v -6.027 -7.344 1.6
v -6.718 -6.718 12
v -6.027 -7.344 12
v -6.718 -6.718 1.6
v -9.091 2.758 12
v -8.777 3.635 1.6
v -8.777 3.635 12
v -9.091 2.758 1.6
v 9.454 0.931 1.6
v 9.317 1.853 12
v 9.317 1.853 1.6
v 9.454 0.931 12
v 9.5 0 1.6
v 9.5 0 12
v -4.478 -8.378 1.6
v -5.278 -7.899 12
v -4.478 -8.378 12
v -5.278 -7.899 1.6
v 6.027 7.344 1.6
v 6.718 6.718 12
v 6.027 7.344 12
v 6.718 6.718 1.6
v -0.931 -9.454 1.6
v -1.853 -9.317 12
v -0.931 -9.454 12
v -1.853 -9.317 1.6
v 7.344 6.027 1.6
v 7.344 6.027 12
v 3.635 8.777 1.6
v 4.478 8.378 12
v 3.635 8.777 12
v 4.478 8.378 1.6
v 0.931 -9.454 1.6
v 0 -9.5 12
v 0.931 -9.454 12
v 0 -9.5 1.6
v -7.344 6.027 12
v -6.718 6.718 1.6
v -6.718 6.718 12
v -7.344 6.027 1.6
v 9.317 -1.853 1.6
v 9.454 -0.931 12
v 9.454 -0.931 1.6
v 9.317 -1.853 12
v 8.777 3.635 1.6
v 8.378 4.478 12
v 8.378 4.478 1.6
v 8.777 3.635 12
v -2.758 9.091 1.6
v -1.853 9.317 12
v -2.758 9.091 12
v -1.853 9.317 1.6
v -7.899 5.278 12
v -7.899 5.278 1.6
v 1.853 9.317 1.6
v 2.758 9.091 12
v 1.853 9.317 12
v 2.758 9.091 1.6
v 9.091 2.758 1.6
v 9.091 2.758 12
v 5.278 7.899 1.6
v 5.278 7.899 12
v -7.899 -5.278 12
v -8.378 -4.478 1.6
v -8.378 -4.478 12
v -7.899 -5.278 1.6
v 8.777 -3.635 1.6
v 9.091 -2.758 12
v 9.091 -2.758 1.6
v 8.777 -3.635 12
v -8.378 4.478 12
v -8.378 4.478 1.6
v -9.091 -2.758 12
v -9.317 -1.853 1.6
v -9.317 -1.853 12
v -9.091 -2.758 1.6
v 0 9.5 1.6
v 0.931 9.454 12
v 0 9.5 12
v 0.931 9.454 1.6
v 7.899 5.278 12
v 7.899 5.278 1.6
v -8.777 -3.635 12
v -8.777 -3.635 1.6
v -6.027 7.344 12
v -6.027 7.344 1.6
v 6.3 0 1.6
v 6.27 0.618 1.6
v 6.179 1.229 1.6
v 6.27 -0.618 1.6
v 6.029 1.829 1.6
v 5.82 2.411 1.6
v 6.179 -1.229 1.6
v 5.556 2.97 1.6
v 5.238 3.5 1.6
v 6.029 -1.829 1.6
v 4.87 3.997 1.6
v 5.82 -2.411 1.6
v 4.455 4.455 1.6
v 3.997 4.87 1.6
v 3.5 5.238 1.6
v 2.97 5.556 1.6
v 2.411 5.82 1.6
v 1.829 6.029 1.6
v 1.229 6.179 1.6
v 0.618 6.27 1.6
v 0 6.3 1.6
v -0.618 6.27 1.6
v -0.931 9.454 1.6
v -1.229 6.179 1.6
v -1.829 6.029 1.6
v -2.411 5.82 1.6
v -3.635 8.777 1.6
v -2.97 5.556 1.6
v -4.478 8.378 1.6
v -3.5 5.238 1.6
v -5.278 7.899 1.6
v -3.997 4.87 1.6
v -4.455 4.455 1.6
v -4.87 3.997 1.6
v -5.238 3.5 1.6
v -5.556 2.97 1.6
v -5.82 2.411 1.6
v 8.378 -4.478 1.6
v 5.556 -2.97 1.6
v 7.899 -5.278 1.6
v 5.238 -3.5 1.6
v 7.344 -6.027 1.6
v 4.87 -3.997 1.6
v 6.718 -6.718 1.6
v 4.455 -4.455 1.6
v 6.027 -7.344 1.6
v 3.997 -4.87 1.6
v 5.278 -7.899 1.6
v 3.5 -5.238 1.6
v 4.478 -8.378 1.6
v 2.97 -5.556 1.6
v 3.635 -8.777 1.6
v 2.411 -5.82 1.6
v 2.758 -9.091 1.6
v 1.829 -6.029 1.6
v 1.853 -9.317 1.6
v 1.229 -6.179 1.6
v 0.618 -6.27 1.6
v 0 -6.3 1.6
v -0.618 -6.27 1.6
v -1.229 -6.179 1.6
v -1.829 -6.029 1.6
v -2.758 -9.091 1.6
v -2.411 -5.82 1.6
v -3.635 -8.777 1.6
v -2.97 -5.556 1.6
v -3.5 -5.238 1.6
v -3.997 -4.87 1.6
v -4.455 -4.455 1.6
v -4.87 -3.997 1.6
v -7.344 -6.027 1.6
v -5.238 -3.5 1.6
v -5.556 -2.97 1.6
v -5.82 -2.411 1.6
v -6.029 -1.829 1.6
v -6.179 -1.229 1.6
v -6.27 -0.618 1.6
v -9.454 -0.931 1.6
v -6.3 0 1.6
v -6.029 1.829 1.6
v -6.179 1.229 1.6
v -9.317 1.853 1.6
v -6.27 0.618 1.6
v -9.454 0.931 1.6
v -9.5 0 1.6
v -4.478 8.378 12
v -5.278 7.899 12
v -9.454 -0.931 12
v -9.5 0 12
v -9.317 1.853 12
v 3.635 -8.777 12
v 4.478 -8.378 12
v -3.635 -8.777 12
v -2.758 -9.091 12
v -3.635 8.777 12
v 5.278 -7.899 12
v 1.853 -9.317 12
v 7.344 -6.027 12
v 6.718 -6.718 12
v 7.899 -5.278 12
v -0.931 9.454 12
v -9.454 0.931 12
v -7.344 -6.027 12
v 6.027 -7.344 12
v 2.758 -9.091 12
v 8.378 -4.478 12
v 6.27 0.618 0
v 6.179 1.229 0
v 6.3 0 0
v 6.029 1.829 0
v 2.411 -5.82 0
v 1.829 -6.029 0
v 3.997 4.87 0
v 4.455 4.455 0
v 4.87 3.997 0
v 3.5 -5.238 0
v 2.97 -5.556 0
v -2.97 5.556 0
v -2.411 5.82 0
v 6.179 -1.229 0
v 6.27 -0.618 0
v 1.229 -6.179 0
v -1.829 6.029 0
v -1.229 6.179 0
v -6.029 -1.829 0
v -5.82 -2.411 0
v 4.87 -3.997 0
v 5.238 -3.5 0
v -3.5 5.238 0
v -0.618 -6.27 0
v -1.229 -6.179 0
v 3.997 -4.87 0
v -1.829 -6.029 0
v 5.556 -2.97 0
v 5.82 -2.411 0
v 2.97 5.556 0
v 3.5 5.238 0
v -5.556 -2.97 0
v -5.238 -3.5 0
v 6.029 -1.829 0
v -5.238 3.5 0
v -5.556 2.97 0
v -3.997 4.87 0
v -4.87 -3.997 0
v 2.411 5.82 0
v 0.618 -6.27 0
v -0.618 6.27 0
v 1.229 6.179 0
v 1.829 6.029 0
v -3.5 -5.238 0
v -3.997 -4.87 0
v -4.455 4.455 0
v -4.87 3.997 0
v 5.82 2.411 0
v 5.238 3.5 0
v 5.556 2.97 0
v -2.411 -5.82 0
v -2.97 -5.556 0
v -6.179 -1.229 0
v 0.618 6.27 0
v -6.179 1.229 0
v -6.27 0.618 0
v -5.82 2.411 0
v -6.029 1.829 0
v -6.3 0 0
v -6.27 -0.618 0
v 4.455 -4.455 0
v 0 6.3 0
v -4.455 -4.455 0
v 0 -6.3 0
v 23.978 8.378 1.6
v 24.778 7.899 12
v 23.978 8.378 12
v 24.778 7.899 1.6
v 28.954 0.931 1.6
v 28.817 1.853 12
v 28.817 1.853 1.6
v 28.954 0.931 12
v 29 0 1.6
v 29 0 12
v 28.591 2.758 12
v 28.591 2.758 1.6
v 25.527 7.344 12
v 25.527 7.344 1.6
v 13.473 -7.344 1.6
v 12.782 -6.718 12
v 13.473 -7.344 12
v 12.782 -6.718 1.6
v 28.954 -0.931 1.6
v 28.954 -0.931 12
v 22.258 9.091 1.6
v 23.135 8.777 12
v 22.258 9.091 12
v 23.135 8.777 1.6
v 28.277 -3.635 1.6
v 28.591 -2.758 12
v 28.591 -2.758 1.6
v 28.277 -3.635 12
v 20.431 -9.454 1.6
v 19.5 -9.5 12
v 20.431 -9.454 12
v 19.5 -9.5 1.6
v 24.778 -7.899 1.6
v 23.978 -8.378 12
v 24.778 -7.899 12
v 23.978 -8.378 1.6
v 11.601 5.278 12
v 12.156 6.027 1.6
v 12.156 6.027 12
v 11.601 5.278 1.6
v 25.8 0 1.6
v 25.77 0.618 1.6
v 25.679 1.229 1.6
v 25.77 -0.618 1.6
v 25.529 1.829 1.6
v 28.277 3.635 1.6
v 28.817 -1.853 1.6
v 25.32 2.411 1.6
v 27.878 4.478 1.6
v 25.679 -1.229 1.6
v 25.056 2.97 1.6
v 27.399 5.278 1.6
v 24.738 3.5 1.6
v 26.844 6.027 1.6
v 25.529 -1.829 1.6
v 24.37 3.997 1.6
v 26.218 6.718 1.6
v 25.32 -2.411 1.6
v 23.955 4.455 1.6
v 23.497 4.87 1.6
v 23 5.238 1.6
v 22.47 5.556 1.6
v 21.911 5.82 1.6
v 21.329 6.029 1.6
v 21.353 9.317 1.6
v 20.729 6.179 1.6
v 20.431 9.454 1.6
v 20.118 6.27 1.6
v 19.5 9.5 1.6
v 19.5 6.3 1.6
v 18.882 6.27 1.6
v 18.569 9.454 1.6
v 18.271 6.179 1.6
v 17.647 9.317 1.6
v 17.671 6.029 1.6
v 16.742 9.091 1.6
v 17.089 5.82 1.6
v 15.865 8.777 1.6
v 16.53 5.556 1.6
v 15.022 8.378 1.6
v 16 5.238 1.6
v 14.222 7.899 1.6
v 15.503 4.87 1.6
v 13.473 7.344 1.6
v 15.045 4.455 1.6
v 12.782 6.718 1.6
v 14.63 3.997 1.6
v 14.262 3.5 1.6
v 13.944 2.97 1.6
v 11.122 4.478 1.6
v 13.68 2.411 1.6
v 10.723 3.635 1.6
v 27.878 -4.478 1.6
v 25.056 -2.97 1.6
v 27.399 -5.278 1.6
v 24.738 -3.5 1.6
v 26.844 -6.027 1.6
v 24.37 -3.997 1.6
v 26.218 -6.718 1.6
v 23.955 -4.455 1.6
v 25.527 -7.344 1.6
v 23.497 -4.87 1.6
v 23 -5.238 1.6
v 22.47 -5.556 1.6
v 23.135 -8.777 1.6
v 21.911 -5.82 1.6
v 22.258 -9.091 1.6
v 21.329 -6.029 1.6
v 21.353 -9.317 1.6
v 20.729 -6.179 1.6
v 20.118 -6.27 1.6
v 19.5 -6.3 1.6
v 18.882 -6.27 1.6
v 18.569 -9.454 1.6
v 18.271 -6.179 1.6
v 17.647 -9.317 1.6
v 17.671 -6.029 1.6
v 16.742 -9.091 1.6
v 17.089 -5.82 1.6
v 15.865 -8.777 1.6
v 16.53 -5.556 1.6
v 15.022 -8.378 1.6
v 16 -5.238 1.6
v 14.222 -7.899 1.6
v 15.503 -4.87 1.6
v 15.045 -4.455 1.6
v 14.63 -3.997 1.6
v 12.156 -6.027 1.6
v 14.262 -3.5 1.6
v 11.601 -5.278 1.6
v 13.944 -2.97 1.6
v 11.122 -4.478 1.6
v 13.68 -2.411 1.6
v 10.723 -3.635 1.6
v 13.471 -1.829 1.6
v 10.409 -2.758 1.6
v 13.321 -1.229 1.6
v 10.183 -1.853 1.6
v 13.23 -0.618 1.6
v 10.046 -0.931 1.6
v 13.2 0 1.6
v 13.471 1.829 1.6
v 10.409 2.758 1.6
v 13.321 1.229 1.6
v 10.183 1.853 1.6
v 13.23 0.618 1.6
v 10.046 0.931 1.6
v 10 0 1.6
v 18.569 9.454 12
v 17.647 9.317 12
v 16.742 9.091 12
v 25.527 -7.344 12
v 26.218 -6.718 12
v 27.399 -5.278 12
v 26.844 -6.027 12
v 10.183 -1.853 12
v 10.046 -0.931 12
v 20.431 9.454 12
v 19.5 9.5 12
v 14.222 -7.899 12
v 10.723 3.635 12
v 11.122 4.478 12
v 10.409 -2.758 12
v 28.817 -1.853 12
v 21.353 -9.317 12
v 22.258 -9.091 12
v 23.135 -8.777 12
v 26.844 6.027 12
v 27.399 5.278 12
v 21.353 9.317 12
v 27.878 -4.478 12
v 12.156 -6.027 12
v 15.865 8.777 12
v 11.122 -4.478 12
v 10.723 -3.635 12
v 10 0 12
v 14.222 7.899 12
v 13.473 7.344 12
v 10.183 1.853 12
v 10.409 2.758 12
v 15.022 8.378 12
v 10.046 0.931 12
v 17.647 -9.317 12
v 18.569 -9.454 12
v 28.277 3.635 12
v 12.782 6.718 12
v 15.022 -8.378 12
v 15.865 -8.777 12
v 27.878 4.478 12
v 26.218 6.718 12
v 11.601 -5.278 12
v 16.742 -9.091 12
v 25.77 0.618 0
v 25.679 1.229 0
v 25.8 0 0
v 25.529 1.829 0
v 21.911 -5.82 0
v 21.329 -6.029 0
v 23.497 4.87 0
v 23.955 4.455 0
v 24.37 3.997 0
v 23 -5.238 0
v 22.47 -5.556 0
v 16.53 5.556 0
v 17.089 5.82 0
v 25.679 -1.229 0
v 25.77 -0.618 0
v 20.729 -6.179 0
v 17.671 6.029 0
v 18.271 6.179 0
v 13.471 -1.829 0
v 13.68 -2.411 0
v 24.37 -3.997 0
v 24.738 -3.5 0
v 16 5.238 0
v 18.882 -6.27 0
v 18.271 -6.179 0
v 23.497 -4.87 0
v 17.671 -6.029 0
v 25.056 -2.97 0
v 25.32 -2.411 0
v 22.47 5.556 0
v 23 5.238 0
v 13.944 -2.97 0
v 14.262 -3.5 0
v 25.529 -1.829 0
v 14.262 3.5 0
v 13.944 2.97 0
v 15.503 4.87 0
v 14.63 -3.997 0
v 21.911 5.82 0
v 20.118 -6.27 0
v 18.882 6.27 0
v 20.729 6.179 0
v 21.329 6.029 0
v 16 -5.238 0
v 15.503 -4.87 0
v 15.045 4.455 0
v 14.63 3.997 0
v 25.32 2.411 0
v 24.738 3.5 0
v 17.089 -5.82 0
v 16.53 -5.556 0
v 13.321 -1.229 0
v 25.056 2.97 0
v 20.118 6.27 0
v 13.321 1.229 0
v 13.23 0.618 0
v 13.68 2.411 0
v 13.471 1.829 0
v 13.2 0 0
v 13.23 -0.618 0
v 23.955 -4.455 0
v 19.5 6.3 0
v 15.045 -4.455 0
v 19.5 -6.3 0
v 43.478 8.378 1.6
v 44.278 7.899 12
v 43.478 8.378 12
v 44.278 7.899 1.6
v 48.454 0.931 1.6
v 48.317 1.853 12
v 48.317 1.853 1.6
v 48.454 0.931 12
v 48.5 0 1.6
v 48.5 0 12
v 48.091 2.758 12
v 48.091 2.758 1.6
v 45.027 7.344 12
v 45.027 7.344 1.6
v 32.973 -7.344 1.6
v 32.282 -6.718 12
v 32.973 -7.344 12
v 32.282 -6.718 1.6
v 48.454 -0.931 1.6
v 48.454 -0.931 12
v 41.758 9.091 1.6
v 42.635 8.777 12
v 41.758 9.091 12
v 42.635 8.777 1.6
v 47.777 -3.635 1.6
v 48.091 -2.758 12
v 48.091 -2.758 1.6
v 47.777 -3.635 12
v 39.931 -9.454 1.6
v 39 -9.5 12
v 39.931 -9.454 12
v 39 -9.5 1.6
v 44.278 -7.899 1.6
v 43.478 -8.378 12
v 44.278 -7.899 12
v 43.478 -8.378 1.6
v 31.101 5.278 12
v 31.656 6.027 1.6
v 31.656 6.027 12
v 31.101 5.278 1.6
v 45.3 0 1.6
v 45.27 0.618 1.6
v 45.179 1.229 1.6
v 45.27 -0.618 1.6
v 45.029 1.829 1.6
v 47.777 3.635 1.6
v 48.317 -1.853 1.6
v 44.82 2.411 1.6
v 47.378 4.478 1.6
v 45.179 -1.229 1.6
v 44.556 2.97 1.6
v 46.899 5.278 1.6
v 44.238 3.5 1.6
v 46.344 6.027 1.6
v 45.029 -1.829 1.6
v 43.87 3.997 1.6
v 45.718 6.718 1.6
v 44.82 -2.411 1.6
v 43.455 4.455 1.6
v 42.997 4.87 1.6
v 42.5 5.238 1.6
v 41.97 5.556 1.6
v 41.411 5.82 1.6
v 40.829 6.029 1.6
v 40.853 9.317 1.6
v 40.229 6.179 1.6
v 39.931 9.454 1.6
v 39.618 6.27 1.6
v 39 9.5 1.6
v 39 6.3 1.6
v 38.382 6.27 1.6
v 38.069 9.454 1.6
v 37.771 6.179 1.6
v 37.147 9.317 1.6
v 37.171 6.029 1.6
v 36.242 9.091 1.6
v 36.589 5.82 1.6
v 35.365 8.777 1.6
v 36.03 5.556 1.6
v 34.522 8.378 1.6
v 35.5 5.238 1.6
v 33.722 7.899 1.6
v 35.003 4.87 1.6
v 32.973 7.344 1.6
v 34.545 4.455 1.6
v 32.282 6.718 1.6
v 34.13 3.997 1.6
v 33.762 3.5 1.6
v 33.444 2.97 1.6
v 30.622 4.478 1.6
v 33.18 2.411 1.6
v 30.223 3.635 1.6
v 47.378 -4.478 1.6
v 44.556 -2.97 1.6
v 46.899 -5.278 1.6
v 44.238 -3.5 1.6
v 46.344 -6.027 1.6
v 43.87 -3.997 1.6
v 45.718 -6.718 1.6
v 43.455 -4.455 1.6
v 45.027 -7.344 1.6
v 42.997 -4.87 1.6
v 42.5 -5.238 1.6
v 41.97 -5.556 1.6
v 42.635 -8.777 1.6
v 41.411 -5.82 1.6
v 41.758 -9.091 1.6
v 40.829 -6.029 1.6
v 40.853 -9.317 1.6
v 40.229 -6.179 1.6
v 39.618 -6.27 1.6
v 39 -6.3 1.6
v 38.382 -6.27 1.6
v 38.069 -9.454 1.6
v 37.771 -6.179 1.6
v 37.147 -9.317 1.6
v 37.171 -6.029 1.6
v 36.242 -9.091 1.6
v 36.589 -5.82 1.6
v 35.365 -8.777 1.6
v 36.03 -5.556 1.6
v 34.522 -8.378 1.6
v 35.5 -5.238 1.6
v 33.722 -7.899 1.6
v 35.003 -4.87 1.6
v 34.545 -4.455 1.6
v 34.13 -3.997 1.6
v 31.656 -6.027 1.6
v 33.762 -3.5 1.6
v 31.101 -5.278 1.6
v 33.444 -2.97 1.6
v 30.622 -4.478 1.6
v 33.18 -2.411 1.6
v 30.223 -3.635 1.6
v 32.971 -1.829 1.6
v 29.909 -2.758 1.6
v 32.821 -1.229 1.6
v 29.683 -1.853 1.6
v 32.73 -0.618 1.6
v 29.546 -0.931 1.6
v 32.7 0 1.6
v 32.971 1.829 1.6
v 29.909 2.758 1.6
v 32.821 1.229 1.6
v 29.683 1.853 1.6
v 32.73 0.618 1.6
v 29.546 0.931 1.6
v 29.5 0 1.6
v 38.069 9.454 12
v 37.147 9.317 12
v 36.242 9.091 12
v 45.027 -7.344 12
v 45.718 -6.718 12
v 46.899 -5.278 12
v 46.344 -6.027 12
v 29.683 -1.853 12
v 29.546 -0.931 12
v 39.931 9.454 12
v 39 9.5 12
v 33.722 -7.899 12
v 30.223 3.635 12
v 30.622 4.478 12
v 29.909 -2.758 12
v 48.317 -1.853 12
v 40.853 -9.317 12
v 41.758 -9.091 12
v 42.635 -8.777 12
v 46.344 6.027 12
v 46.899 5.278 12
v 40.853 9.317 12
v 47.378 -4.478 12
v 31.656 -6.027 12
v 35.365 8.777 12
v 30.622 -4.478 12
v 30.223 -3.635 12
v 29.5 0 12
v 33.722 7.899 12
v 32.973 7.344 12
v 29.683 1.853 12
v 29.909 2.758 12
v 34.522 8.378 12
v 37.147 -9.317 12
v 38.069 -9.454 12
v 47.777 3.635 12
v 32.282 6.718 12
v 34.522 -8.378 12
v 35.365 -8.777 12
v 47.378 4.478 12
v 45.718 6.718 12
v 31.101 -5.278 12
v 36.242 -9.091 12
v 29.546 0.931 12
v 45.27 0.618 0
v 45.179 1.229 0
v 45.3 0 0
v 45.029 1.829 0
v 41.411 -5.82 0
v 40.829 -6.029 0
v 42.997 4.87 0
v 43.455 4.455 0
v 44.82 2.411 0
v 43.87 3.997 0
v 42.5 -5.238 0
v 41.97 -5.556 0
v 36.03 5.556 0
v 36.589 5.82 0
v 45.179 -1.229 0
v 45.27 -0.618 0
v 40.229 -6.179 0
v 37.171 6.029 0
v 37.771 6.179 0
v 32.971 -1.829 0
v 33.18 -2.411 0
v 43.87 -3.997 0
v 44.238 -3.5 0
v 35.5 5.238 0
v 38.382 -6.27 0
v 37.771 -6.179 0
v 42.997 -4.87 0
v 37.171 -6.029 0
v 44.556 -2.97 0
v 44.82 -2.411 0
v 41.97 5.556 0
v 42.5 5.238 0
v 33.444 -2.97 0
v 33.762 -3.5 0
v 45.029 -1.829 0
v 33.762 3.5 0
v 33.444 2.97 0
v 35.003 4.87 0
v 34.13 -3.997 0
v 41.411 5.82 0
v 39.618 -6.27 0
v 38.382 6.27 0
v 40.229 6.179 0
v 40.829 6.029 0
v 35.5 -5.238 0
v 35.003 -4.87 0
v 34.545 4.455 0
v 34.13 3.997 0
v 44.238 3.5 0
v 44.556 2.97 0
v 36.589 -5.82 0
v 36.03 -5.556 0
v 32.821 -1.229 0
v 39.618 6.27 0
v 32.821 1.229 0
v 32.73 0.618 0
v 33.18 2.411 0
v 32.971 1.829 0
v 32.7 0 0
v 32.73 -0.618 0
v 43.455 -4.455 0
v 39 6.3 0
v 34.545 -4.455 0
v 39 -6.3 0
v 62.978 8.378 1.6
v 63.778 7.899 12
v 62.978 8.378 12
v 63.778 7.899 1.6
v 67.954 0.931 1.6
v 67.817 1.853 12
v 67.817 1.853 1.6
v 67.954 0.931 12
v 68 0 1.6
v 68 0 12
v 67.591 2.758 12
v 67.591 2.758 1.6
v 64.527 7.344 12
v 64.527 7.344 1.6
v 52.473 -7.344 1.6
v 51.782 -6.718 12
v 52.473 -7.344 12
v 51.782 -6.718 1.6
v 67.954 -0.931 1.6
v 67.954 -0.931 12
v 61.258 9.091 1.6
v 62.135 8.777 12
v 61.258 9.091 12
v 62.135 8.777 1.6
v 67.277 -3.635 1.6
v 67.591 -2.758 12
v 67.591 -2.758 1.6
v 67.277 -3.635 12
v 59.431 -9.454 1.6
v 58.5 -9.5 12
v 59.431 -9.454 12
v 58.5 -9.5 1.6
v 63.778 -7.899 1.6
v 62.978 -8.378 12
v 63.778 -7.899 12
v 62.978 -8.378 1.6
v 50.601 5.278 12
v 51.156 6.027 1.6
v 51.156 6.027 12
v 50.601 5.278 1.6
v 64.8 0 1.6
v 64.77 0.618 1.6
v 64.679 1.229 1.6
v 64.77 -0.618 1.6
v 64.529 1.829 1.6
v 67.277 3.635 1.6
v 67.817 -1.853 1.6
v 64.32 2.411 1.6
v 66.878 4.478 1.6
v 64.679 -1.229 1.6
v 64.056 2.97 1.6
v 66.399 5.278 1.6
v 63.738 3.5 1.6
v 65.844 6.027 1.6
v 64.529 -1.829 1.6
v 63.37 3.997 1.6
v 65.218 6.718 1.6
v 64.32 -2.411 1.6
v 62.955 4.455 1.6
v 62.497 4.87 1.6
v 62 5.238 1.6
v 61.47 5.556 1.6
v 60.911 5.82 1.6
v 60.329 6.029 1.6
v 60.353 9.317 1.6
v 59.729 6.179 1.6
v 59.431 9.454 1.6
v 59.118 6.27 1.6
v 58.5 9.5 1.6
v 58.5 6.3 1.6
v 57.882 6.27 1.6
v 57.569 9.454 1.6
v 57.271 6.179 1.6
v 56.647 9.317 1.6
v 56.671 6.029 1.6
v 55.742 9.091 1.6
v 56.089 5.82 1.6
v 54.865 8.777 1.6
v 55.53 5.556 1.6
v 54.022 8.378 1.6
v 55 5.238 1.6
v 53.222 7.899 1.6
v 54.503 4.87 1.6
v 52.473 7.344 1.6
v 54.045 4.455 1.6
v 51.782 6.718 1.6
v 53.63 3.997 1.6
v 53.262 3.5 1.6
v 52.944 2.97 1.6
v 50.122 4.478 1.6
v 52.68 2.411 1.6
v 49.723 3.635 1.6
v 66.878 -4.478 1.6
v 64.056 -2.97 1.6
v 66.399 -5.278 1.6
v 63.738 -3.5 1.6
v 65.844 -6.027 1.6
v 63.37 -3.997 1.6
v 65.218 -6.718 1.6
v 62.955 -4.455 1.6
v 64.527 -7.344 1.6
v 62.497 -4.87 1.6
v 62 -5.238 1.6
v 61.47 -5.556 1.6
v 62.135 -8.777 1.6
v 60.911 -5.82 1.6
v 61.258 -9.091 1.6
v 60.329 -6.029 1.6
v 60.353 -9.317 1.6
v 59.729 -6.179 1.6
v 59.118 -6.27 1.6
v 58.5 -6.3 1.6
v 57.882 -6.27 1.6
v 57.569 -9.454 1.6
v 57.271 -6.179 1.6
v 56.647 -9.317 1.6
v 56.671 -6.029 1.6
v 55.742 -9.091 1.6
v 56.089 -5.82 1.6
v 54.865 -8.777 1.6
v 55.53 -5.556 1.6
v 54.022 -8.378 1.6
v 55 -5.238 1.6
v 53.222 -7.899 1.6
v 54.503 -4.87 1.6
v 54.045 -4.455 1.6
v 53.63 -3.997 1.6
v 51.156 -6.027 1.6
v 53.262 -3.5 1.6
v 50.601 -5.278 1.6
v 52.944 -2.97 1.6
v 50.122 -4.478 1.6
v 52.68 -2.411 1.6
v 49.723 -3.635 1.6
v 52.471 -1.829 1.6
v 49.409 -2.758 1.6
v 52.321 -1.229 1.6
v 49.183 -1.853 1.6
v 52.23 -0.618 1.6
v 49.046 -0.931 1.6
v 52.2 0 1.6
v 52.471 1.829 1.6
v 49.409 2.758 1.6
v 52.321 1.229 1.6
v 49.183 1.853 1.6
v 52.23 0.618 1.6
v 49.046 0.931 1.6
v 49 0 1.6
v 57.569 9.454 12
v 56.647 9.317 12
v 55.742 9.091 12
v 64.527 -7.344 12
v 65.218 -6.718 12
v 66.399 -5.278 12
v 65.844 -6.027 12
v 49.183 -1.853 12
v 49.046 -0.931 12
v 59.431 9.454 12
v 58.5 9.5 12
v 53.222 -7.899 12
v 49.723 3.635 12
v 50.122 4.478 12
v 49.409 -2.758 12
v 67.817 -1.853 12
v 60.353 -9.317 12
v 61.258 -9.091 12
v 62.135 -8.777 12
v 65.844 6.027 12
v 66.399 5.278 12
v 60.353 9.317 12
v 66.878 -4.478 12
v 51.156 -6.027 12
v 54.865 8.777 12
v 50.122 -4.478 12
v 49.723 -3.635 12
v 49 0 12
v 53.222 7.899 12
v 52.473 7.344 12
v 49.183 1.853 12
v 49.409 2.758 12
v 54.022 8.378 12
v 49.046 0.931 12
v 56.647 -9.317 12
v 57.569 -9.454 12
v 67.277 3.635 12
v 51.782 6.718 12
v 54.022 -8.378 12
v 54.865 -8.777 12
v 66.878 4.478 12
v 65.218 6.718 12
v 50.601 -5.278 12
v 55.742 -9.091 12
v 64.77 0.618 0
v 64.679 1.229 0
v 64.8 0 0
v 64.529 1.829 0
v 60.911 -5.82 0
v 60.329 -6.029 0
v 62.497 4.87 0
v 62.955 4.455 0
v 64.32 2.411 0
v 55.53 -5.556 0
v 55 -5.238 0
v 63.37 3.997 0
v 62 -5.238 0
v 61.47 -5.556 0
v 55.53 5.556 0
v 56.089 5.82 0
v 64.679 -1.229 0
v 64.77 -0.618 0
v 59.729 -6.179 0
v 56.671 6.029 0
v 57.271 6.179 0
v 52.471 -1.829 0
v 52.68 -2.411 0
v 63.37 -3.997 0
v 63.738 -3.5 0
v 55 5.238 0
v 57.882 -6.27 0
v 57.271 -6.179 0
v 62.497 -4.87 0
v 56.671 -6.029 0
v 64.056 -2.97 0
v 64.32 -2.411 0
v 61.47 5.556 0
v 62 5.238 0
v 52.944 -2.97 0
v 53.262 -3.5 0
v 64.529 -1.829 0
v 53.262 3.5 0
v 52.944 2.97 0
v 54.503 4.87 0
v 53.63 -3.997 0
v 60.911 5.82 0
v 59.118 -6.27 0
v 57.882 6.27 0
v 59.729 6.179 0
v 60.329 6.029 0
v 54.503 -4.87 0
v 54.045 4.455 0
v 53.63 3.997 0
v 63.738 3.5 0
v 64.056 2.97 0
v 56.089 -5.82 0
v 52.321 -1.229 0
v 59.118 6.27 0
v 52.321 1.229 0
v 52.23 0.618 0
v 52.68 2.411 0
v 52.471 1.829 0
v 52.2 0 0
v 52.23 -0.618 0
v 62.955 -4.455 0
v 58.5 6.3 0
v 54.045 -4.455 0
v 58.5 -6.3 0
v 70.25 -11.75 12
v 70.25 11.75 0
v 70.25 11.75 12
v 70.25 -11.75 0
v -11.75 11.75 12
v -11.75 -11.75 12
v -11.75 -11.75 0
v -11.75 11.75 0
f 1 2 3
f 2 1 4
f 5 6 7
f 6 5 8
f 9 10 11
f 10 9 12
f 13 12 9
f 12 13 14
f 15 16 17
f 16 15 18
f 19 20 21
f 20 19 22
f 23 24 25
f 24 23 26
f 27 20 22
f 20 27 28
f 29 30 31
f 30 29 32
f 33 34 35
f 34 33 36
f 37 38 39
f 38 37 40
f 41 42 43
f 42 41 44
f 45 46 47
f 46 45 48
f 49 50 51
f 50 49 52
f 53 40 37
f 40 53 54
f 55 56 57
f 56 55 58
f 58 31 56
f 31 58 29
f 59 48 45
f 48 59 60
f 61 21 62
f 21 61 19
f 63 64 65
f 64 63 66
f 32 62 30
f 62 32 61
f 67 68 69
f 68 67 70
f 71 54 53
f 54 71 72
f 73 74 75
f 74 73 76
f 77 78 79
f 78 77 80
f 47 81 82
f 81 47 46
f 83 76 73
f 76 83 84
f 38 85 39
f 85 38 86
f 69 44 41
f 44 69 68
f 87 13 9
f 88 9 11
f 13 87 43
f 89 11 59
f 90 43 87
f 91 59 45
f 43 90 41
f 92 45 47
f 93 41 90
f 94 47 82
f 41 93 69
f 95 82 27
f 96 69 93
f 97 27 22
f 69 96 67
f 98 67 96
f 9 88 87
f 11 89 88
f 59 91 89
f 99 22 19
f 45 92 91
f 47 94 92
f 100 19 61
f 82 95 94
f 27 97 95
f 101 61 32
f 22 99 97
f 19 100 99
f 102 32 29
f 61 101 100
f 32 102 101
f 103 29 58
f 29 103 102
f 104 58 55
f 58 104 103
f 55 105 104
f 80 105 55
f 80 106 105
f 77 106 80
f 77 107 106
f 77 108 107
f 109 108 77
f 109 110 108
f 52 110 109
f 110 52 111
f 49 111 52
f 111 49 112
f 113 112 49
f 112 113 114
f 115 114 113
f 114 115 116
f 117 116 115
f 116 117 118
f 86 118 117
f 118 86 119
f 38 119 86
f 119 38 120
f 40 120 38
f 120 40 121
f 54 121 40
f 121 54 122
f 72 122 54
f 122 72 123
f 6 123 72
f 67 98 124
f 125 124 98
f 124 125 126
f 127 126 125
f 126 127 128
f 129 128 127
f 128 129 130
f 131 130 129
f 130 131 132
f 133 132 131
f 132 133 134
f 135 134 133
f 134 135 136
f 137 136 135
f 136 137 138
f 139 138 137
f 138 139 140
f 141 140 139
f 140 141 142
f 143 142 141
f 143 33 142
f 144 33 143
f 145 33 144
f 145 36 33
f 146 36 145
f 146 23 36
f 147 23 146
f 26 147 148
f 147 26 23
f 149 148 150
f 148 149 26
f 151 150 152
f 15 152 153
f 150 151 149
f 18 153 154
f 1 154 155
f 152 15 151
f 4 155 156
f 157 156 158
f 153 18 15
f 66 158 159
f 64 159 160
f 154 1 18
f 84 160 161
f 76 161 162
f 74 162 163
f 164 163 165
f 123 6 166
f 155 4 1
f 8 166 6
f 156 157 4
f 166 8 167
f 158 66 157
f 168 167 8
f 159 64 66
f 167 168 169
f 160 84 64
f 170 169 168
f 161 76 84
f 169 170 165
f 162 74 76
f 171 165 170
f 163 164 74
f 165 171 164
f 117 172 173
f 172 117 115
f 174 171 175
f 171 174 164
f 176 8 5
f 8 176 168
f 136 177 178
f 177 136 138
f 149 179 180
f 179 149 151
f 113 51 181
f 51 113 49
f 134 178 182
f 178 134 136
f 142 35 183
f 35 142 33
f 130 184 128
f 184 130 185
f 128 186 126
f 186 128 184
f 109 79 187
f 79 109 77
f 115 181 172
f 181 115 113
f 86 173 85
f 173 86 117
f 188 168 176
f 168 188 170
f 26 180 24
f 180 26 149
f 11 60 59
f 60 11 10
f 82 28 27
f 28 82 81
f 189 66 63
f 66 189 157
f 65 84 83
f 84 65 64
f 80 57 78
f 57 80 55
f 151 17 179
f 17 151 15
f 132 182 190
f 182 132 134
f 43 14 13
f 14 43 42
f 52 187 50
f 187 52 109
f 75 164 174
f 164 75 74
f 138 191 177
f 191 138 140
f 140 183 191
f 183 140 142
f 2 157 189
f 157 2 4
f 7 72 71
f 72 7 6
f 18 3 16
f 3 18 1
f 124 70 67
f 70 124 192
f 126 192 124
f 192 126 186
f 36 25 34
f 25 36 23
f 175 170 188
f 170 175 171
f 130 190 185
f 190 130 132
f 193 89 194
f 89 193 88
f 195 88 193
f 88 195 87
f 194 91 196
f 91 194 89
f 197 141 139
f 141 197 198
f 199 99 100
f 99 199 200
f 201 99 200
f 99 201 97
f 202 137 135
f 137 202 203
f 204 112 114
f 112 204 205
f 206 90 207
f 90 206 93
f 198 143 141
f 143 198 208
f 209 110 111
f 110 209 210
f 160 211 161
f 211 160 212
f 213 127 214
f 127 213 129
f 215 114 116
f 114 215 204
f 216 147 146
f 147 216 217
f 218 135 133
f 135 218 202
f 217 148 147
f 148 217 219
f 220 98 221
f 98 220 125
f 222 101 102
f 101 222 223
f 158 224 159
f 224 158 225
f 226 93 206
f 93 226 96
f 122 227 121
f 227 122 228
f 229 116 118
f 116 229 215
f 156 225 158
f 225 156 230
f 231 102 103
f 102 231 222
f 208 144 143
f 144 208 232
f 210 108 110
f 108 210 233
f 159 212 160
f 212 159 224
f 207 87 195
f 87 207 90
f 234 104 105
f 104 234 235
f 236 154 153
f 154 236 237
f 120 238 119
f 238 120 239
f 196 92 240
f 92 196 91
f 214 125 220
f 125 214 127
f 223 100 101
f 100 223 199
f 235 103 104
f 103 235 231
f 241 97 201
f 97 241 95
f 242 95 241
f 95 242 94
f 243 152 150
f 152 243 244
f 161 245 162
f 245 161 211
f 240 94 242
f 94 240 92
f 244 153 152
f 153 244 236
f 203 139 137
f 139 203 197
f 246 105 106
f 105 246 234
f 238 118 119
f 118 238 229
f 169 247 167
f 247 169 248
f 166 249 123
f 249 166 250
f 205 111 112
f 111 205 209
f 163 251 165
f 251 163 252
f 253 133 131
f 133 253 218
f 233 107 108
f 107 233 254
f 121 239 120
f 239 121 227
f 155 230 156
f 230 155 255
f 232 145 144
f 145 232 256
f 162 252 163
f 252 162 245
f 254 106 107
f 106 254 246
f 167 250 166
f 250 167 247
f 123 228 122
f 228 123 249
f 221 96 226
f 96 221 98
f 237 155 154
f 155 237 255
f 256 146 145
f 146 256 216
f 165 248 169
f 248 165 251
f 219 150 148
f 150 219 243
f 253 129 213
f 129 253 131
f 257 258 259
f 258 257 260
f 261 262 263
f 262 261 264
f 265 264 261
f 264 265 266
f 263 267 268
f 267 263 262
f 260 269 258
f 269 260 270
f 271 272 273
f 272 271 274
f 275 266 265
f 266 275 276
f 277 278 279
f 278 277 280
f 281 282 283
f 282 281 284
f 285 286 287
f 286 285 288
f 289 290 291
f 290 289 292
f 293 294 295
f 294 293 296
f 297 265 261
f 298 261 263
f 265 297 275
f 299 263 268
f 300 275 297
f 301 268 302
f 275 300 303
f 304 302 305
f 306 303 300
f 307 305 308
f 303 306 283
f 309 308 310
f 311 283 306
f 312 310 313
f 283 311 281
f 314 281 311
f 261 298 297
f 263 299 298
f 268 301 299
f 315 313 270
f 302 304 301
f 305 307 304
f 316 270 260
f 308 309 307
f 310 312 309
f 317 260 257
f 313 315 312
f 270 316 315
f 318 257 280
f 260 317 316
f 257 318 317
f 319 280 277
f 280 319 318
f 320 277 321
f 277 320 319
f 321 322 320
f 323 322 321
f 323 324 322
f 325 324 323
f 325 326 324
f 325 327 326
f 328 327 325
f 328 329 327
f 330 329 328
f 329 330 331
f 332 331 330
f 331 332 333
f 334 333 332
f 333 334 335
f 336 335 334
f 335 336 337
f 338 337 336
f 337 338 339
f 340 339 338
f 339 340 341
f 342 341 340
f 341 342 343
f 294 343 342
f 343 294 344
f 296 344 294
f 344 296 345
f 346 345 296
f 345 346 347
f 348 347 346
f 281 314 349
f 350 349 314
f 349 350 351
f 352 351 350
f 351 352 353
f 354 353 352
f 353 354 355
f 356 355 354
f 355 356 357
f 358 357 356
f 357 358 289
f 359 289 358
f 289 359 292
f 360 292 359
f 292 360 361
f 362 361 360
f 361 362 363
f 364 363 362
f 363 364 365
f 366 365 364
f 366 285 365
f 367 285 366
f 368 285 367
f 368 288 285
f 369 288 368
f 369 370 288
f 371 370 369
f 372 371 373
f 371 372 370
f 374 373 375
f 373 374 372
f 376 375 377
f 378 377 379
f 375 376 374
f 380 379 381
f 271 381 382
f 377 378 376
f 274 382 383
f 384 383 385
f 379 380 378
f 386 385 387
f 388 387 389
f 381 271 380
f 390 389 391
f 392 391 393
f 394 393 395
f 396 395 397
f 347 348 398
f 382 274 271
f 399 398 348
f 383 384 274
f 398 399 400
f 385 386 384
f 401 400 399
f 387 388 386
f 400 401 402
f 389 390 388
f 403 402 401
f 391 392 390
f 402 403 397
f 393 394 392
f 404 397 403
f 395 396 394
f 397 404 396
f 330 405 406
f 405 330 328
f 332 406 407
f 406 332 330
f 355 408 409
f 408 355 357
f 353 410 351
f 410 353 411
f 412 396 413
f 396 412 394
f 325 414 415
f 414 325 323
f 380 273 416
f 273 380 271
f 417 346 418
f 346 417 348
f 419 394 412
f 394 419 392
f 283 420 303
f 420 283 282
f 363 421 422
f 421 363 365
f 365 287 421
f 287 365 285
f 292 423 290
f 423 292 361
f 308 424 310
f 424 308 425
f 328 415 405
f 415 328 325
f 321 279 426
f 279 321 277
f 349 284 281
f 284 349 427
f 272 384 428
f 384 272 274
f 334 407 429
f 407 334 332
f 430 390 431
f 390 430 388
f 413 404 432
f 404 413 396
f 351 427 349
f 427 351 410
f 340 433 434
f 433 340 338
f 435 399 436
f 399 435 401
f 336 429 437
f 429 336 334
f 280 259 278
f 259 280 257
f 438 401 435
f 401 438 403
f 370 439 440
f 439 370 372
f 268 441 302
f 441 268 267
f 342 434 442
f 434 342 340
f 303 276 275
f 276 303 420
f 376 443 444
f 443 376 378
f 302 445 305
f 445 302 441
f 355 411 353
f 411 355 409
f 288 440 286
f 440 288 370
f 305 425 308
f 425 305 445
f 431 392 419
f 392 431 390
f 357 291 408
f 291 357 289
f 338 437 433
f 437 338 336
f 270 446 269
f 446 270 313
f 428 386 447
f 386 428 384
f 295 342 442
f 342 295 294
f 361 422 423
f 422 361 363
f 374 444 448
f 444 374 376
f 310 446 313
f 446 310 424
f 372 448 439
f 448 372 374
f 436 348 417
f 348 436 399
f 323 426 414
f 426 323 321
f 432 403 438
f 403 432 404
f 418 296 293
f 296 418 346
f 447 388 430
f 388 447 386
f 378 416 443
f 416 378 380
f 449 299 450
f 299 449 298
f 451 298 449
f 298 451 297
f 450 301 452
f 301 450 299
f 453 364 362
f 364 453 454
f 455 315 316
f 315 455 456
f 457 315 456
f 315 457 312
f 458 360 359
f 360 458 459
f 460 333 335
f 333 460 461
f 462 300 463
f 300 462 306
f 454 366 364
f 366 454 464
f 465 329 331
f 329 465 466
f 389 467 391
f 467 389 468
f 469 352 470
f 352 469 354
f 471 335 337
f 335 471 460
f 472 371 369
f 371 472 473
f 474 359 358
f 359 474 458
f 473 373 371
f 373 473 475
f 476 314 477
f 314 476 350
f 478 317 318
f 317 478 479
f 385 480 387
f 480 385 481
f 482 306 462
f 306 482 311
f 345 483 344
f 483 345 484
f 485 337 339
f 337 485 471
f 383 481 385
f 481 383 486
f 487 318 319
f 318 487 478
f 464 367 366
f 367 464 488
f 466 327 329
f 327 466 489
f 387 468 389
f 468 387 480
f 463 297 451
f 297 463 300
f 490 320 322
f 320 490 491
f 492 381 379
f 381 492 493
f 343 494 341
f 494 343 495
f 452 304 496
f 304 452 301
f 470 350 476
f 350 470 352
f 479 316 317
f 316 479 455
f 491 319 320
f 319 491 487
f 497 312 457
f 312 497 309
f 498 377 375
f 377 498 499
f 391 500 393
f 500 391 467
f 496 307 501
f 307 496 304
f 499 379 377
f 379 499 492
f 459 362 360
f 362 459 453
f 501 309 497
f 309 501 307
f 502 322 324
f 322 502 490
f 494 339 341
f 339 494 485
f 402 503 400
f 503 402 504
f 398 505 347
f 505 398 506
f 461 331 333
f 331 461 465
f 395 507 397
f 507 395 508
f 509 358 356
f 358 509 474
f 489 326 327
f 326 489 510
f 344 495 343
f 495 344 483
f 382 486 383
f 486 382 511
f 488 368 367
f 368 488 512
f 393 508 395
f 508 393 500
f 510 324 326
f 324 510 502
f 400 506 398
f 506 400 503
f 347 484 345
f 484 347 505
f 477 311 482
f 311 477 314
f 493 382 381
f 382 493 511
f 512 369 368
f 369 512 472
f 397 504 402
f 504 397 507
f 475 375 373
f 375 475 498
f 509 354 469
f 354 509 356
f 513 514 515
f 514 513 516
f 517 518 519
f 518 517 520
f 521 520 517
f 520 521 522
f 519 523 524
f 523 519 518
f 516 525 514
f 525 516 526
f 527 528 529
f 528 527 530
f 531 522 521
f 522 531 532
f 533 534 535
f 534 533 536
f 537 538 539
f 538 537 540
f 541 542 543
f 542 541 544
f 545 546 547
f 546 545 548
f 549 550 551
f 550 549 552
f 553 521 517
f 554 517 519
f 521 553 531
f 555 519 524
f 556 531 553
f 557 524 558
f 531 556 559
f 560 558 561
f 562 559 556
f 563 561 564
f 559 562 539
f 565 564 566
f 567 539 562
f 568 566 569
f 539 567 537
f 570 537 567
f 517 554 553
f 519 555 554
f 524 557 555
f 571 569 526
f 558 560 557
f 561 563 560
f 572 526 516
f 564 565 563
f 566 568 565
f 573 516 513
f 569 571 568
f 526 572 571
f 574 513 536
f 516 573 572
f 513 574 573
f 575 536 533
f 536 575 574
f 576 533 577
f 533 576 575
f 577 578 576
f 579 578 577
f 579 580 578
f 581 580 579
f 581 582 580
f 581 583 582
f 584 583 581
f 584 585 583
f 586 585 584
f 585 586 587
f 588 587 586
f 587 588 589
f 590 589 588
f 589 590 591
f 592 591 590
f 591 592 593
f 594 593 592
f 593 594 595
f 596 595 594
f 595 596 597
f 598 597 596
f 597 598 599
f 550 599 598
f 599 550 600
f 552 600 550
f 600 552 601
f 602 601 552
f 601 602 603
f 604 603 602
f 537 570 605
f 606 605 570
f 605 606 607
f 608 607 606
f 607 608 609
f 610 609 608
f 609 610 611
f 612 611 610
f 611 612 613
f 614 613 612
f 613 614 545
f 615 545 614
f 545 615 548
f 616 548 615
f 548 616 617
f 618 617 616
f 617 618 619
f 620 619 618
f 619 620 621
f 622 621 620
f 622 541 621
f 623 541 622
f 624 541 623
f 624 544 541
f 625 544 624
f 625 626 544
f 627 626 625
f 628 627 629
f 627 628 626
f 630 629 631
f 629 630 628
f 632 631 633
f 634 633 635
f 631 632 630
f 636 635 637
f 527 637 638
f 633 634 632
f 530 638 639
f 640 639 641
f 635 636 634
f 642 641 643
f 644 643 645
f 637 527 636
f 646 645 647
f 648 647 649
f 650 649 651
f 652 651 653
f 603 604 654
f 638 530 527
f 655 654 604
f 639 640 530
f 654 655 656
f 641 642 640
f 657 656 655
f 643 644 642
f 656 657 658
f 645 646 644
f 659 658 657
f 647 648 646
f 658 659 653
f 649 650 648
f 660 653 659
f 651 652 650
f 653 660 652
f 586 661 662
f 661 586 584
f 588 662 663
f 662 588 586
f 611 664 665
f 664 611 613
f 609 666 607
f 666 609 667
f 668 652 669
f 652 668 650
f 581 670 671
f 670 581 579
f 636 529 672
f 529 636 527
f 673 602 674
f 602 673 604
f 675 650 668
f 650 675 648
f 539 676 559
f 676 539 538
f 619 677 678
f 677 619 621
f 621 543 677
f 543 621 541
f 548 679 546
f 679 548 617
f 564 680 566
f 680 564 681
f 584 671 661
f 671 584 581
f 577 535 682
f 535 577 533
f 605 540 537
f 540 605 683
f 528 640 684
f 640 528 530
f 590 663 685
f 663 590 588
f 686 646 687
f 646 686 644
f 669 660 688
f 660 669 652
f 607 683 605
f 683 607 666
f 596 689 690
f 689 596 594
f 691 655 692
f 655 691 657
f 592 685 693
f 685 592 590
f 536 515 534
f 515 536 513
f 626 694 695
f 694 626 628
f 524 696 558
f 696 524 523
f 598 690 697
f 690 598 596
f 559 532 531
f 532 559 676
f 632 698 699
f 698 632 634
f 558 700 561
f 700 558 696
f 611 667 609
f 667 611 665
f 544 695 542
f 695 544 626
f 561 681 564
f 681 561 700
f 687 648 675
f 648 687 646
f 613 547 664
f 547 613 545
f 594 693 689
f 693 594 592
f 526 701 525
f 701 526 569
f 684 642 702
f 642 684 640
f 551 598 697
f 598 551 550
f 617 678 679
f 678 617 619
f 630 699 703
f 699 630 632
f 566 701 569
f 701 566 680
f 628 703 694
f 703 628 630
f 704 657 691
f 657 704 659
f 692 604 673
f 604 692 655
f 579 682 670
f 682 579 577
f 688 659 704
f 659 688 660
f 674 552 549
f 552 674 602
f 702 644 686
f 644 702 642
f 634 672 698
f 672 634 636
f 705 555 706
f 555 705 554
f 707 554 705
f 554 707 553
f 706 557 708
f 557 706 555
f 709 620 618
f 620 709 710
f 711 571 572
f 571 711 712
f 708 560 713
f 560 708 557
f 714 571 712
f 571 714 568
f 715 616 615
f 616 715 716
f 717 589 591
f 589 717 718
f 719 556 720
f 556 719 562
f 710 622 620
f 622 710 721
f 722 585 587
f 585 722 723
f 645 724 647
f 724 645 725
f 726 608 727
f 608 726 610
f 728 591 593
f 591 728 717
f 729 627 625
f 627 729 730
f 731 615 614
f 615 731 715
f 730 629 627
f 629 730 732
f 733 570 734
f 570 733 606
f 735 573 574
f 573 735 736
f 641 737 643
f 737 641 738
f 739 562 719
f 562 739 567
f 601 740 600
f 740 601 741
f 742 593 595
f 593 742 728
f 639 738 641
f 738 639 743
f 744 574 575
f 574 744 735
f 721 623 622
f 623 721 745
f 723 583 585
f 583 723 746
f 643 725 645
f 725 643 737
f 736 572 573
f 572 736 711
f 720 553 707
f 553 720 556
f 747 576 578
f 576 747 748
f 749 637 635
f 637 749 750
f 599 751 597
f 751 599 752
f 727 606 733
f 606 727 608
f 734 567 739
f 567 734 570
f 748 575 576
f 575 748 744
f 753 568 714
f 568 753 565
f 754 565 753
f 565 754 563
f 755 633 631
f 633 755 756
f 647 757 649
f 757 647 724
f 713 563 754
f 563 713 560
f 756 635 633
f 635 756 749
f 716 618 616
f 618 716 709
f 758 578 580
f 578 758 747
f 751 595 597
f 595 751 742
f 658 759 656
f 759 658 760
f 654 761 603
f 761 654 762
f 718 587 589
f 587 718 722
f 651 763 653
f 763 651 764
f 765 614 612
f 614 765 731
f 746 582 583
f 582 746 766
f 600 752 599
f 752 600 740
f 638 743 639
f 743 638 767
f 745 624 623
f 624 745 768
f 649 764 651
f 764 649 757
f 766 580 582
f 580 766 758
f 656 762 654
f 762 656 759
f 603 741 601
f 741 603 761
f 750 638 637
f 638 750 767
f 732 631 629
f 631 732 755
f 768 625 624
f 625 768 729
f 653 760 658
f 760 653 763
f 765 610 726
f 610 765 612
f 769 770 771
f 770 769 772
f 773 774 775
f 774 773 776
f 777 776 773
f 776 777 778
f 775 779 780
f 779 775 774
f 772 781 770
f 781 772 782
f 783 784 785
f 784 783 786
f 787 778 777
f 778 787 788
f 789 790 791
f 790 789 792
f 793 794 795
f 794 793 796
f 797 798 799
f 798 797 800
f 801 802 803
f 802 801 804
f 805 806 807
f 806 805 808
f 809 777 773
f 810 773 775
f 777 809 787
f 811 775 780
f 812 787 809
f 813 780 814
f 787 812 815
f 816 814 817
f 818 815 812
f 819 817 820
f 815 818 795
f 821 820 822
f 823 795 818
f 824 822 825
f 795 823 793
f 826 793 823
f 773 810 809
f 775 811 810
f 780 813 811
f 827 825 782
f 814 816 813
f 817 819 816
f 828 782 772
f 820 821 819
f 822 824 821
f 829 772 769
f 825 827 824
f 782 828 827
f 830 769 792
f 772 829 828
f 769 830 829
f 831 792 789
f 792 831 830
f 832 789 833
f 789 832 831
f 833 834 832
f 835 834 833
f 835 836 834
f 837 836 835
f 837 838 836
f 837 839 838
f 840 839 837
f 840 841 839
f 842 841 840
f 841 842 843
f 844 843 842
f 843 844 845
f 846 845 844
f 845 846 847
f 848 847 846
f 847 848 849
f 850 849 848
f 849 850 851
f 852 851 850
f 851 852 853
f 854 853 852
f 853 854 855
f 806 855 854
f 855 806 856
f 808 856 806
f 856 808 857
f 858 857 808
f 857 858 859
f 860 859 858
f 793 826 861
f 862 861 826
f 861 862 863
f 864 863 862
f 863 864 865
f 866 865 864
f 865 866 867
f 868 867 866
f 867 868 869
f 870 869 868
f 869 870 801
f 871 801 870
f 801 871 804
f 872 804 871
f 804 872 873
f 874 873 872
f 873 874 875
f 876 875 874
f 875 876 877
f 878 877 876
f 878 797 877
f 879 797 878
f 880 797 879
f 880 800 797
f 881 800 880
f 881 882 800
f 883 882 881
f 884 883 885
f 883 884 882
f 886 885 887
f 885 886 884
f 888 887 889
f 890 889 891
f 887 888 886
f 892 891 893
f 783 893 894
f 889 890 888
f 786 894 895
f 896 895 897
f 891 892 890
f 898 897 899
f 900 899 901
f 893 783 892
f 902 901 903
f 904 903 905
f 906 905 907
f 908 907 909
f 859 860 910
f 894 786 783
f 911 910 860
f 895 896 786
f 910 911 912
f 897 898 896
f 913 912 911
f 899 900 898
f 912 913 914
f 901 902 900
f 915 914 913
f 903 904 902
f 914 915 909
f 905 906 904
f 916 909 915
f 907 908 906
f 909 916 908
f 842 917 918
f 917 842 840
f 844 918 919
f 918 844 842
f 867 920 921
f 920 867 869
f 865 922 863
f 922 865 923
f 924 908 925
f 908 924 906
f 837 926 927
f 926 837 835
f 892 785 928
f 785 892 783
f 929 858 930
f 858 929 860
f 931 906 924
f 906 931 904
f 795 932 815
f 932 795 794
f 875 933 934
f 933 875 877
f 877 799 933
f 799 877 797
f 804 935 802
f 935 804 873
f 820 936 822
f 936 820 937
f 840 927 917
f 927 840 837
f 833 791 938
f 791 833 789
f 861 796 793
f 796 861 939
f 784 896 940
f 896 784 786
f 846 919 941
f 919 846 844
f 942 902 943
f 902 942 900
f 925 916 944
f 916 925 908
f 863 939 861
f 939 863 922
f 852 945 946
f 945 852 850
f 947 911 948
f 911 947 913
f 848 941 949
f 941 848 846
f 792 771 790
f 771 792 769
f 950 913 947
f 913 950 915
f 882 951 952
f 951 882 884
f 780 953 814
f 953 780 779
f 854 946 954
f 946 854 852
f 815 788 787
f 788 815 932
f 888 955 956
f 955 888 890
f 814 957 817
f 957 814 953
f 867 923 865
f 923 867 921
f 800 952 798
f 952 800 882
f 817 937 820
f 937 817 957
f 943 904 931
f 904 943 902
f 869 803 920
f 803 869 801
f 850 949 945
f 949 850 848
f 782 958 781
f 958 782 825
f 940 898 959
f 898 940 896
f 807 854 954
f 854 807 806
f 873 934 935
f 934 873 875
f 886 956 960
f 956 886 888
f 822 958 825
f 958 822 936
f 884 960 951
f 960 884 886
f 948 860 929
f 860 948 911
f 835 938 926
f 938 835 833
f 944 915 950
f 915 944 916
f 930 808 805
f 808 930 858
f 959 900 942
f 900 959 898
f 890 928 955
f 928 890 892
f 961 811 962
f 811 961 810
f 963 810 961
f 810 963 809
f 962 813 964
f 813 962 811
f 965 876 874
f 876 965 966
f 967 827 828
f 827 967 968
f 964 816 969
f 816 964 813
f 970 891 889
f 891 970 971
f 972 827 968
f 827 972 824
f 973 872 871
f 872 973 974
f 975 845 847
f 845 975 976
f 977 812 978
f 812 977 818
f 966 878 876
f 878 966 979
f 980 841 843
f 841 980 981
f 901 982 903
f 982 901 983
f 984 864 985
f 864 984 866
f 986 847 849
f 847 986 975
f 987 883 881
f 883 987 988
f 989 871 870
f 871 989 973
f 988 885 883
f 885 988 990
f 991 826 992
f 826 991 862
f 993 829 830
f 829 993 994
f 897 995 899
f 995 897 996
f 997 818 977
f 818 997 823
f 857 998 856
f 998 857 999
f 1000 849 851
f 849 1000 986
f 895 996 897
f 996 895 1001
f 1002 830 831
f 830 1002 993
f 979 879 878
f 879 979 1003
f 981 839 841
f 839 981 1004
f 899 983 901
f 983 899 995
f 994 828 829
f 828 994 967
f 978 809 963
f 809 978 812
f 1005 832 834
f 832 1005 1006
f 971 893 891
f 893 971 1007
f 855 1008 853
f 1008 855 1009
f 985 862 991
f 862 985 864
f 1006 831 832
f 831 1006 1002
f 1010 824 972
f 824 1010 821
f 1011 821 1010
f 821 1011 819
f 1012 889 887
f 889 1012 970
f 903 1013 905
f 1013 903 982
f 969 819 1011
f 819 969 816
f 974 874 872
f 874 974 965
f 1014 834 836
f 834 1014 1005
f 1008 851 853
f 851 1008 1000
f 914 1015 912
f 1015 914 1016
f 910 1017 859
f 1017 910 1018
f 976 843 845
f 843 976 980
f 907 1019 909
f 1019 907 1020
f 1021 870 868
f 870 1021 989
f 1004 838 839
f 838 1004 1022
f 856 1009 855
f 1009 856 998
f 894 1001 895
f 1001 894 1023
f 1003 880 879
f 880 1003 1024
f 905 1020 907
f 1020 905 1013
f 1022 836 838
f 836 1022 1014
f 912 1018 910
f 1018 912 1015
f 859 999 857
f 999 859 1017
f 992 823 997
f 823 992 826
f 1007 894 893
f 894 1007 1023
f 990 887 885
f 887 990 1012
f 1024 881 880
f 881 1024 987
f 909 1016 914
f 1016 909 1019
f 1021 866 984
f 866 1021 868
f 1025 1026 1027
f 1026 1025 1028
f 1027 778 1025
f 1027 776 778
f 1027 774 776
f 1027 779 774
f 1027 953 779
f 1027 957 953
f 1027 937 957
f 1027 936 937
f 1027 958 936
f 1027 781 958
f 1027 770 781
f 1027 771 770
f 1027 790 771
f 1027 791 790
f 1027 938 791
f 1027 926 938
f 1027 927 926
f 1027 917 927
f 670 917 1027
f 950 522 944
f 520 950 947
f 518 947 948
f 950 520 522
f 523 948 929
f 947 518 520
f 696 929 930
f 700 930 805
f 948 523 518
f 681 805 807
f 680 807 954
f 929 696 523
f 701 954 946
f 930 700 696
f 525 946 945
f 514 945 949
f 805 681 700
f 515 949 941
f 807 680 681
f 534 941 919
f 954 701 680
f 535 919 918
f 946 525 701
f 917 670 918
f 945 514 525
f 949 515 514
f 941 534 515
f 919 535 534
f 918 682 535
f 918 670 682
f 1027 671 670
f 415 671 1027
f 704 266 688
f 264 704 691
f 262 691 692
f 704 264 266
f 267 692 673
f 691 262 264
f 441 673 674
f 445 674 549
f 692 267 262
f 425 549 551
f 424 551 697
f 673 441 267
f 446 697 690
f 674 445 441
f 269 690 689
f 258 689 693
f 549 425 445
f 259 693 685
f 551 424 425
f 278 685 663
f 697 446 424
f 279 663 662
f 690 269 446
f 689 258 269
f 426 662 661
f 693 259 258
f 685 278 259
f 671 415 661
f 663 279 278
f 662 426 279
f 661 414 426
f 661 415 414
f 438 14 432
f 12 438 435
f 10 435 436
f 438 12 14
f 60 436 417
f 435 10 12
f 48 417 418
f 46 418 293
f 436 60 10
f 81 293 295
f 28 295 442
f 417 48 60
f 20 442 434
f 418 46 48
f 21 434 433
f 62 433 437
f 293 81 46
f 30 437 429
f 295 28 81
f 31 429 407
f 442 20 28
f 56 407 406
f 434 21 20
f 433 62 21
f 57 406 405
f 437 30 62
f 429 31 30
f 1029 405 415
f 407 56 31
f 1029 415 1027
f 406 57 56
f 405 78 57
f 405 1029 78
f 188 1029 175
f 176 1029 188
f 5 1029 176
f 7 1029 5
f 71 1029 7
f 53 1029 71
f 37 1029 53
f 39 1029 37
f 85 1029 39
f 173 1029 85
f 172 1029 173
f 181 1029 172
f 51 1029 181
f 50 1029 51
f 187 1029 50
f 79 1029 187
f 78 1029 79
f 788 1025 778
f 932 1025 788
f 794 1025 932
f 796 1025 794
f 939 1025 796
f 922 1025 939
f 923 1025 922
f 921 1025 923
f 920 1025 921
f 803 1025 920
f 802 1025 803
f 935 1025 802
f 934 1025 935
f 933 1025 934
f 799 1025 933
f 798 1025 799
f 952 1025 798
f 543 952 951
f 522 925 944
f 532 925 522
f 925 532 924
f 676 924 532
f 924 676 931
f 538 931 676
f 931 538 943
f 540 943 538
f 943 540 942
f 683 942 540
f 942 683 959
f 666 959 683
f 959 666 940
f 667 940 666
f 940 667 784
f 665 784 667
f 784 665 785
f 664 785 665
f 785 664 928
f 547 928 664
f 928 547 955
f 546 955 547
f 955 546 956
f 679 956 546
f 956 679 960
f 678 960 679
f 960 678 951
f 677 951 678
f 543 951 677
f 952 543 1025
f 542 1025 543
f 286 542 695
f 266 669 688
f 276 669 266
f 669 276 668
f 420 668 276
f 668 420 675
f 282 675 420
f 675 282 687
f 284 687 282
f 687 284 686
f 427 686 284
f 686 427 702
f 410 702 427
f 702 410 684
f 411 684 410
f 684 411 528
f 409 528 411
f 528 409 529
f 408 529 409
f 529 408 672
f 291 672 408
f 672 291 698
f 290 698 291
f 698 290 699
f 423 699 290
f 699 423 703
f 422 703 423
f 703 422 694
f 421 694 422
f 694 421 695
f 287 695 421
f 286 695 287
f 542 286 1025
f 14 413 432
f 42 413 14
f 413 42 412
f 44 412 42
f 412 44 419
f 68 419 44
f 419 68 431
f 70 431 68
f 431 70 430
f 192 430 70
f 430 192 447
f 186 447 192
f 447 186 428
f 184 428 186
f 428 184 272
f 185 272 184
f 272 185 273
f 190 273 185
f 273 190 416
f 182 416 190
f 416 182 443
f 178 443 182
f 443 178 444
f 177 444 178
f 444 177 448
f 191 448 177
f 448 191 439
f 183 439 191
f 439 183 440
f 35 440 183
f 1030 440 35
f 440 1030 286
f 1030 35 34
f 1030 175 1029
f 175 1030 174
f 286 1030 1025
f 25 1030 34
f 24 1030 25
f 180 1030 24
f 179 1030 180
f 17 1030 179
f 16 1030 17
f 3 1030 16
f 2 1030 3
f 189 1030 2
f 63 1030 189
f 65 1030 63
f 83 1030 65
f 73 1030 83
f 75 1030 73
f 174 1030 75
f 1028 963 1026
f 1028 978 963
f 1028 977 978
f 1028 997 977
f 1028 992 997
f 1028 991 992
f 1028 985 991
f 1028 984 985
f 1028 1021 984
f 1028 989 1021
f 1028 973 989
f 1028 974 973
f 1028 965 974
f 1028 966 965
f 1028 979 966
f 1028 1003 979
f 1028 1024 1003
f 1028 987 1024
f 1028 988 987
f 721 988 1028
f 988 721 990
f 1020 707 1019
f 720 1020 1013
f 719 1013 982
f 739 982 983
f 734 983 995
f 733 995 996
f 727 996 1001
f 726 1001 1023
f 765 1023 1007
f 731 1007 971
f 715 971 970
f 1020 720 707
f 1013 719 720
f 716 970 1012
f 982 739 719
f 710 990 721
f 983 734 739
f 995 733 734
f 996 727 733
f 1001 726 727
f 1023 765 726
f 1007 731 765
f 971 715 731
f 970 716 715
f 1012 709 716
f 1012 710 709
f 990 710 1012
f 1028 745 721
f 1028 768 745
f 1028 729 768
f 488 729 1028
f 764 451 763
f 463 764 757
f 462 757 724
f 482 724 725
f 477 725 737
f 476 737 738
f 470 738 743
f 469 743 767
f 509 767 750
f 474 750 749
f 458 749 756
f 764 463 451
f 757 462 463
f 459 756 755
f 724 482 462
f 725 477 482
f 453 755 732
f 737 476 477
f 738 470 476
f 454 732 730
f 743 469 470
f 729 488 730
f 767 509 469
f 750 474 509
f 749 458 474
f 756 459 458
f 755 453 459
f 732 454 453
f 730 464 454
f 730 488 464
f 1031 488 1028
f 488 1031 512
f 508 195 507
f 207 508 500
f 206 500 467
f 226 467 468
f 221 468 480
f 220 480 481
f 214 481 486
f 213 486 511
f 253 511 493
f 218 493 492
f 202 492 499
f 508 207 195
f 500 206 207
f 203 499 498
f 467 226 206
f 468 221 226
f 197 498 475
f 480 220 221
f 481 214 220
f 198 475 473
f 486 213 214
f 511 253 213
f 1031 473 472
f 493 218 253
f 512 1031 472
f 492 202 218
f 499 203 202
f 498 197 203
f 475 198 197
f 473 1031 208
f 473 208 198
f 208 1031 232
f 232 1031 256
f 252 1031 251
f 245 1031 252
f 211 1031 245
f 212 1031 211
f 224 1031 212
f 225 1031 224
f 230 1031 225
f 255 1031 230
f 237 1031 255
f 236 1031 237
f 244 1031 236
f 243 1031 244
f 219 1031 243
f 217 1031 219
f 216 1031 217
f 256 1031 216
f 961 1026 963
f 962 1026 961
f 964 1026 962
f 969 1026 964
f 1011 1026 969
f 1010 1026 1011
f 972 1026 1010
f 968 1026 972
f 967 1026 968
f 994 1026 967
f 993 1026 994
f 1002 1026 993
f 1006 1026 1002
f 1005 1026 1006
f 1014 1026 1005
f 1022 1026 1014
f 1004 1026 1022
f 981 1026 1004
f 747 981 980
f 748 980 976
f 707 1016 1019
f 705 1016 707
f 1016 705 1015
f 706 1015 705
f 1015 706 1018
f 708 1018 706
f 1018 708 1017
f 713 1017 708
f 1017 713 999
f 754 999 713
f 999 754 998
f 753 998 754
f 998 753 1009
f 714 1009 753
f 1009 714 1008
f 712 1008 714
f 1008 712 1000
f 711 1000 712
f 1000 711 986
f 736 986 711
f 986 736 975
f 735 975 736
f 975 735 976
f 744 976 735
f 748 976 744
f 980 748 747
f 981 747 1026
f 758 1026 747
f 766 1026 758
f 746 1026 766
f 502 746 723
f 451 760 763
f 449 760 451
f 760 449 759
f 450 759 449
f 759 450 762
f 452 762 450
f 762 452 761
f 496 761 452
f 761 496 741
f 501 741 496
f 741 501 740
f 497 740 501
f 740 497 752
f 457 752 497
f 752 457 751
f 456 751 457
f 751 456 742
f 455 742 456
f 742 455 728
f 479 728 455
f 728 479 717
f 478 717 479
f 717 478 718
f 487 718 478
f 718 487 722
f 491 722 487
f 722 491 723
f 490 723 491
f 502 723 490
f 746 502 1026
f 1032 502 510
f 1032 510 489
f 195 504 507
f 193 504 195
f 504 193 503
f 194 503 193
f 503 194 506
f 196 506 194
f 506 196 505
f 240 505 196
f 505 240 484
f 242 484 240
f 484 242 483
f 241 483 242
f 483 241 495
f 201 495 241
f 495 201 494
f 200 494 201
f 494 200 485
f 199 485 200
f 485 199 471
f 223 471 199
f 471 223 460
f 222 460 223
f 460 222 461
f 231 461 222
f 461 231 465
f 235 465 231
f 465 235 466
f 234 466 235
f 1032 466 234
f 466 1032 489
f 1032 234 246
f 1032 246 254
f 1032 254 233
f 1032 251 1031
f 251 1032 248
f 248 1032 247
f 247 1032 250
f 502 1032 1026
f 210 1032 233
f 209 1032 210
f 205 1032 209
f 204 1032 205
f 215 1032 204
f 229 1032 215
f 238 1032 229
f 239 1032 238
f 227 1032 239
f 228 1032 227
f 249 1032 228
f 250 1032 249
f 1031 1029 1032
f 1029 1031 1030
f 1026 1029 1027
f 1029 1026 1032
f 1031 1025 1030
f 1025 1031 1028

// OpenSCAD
// N-cell 18650 holder / spacer grid (for packs with spot-welded strips or wire). CC0.
cells_x = 4; cells_y = 1; cell = 18.6; pitch = 19.5; h = 12; floor_h = 1.6;
$fn = 64;
difference() {
  translate([-pitch / 2 - 2, -pitch / 2 - 2, 0]) cube([cells_x * pitch + 4, cells_y * pitch + 4, h]);
  for (i = [0 : cells_x - 1], j = [0 : cells_y - 1]) {
    translate([i * pitch, j * pitch, floor_h]) cylinder(d = cell + 0.4, h = h);
    translate([i * pitch, j * pitch, -1]) cylinder(d = cell - 6, h = h);   // contact window
  }
}
